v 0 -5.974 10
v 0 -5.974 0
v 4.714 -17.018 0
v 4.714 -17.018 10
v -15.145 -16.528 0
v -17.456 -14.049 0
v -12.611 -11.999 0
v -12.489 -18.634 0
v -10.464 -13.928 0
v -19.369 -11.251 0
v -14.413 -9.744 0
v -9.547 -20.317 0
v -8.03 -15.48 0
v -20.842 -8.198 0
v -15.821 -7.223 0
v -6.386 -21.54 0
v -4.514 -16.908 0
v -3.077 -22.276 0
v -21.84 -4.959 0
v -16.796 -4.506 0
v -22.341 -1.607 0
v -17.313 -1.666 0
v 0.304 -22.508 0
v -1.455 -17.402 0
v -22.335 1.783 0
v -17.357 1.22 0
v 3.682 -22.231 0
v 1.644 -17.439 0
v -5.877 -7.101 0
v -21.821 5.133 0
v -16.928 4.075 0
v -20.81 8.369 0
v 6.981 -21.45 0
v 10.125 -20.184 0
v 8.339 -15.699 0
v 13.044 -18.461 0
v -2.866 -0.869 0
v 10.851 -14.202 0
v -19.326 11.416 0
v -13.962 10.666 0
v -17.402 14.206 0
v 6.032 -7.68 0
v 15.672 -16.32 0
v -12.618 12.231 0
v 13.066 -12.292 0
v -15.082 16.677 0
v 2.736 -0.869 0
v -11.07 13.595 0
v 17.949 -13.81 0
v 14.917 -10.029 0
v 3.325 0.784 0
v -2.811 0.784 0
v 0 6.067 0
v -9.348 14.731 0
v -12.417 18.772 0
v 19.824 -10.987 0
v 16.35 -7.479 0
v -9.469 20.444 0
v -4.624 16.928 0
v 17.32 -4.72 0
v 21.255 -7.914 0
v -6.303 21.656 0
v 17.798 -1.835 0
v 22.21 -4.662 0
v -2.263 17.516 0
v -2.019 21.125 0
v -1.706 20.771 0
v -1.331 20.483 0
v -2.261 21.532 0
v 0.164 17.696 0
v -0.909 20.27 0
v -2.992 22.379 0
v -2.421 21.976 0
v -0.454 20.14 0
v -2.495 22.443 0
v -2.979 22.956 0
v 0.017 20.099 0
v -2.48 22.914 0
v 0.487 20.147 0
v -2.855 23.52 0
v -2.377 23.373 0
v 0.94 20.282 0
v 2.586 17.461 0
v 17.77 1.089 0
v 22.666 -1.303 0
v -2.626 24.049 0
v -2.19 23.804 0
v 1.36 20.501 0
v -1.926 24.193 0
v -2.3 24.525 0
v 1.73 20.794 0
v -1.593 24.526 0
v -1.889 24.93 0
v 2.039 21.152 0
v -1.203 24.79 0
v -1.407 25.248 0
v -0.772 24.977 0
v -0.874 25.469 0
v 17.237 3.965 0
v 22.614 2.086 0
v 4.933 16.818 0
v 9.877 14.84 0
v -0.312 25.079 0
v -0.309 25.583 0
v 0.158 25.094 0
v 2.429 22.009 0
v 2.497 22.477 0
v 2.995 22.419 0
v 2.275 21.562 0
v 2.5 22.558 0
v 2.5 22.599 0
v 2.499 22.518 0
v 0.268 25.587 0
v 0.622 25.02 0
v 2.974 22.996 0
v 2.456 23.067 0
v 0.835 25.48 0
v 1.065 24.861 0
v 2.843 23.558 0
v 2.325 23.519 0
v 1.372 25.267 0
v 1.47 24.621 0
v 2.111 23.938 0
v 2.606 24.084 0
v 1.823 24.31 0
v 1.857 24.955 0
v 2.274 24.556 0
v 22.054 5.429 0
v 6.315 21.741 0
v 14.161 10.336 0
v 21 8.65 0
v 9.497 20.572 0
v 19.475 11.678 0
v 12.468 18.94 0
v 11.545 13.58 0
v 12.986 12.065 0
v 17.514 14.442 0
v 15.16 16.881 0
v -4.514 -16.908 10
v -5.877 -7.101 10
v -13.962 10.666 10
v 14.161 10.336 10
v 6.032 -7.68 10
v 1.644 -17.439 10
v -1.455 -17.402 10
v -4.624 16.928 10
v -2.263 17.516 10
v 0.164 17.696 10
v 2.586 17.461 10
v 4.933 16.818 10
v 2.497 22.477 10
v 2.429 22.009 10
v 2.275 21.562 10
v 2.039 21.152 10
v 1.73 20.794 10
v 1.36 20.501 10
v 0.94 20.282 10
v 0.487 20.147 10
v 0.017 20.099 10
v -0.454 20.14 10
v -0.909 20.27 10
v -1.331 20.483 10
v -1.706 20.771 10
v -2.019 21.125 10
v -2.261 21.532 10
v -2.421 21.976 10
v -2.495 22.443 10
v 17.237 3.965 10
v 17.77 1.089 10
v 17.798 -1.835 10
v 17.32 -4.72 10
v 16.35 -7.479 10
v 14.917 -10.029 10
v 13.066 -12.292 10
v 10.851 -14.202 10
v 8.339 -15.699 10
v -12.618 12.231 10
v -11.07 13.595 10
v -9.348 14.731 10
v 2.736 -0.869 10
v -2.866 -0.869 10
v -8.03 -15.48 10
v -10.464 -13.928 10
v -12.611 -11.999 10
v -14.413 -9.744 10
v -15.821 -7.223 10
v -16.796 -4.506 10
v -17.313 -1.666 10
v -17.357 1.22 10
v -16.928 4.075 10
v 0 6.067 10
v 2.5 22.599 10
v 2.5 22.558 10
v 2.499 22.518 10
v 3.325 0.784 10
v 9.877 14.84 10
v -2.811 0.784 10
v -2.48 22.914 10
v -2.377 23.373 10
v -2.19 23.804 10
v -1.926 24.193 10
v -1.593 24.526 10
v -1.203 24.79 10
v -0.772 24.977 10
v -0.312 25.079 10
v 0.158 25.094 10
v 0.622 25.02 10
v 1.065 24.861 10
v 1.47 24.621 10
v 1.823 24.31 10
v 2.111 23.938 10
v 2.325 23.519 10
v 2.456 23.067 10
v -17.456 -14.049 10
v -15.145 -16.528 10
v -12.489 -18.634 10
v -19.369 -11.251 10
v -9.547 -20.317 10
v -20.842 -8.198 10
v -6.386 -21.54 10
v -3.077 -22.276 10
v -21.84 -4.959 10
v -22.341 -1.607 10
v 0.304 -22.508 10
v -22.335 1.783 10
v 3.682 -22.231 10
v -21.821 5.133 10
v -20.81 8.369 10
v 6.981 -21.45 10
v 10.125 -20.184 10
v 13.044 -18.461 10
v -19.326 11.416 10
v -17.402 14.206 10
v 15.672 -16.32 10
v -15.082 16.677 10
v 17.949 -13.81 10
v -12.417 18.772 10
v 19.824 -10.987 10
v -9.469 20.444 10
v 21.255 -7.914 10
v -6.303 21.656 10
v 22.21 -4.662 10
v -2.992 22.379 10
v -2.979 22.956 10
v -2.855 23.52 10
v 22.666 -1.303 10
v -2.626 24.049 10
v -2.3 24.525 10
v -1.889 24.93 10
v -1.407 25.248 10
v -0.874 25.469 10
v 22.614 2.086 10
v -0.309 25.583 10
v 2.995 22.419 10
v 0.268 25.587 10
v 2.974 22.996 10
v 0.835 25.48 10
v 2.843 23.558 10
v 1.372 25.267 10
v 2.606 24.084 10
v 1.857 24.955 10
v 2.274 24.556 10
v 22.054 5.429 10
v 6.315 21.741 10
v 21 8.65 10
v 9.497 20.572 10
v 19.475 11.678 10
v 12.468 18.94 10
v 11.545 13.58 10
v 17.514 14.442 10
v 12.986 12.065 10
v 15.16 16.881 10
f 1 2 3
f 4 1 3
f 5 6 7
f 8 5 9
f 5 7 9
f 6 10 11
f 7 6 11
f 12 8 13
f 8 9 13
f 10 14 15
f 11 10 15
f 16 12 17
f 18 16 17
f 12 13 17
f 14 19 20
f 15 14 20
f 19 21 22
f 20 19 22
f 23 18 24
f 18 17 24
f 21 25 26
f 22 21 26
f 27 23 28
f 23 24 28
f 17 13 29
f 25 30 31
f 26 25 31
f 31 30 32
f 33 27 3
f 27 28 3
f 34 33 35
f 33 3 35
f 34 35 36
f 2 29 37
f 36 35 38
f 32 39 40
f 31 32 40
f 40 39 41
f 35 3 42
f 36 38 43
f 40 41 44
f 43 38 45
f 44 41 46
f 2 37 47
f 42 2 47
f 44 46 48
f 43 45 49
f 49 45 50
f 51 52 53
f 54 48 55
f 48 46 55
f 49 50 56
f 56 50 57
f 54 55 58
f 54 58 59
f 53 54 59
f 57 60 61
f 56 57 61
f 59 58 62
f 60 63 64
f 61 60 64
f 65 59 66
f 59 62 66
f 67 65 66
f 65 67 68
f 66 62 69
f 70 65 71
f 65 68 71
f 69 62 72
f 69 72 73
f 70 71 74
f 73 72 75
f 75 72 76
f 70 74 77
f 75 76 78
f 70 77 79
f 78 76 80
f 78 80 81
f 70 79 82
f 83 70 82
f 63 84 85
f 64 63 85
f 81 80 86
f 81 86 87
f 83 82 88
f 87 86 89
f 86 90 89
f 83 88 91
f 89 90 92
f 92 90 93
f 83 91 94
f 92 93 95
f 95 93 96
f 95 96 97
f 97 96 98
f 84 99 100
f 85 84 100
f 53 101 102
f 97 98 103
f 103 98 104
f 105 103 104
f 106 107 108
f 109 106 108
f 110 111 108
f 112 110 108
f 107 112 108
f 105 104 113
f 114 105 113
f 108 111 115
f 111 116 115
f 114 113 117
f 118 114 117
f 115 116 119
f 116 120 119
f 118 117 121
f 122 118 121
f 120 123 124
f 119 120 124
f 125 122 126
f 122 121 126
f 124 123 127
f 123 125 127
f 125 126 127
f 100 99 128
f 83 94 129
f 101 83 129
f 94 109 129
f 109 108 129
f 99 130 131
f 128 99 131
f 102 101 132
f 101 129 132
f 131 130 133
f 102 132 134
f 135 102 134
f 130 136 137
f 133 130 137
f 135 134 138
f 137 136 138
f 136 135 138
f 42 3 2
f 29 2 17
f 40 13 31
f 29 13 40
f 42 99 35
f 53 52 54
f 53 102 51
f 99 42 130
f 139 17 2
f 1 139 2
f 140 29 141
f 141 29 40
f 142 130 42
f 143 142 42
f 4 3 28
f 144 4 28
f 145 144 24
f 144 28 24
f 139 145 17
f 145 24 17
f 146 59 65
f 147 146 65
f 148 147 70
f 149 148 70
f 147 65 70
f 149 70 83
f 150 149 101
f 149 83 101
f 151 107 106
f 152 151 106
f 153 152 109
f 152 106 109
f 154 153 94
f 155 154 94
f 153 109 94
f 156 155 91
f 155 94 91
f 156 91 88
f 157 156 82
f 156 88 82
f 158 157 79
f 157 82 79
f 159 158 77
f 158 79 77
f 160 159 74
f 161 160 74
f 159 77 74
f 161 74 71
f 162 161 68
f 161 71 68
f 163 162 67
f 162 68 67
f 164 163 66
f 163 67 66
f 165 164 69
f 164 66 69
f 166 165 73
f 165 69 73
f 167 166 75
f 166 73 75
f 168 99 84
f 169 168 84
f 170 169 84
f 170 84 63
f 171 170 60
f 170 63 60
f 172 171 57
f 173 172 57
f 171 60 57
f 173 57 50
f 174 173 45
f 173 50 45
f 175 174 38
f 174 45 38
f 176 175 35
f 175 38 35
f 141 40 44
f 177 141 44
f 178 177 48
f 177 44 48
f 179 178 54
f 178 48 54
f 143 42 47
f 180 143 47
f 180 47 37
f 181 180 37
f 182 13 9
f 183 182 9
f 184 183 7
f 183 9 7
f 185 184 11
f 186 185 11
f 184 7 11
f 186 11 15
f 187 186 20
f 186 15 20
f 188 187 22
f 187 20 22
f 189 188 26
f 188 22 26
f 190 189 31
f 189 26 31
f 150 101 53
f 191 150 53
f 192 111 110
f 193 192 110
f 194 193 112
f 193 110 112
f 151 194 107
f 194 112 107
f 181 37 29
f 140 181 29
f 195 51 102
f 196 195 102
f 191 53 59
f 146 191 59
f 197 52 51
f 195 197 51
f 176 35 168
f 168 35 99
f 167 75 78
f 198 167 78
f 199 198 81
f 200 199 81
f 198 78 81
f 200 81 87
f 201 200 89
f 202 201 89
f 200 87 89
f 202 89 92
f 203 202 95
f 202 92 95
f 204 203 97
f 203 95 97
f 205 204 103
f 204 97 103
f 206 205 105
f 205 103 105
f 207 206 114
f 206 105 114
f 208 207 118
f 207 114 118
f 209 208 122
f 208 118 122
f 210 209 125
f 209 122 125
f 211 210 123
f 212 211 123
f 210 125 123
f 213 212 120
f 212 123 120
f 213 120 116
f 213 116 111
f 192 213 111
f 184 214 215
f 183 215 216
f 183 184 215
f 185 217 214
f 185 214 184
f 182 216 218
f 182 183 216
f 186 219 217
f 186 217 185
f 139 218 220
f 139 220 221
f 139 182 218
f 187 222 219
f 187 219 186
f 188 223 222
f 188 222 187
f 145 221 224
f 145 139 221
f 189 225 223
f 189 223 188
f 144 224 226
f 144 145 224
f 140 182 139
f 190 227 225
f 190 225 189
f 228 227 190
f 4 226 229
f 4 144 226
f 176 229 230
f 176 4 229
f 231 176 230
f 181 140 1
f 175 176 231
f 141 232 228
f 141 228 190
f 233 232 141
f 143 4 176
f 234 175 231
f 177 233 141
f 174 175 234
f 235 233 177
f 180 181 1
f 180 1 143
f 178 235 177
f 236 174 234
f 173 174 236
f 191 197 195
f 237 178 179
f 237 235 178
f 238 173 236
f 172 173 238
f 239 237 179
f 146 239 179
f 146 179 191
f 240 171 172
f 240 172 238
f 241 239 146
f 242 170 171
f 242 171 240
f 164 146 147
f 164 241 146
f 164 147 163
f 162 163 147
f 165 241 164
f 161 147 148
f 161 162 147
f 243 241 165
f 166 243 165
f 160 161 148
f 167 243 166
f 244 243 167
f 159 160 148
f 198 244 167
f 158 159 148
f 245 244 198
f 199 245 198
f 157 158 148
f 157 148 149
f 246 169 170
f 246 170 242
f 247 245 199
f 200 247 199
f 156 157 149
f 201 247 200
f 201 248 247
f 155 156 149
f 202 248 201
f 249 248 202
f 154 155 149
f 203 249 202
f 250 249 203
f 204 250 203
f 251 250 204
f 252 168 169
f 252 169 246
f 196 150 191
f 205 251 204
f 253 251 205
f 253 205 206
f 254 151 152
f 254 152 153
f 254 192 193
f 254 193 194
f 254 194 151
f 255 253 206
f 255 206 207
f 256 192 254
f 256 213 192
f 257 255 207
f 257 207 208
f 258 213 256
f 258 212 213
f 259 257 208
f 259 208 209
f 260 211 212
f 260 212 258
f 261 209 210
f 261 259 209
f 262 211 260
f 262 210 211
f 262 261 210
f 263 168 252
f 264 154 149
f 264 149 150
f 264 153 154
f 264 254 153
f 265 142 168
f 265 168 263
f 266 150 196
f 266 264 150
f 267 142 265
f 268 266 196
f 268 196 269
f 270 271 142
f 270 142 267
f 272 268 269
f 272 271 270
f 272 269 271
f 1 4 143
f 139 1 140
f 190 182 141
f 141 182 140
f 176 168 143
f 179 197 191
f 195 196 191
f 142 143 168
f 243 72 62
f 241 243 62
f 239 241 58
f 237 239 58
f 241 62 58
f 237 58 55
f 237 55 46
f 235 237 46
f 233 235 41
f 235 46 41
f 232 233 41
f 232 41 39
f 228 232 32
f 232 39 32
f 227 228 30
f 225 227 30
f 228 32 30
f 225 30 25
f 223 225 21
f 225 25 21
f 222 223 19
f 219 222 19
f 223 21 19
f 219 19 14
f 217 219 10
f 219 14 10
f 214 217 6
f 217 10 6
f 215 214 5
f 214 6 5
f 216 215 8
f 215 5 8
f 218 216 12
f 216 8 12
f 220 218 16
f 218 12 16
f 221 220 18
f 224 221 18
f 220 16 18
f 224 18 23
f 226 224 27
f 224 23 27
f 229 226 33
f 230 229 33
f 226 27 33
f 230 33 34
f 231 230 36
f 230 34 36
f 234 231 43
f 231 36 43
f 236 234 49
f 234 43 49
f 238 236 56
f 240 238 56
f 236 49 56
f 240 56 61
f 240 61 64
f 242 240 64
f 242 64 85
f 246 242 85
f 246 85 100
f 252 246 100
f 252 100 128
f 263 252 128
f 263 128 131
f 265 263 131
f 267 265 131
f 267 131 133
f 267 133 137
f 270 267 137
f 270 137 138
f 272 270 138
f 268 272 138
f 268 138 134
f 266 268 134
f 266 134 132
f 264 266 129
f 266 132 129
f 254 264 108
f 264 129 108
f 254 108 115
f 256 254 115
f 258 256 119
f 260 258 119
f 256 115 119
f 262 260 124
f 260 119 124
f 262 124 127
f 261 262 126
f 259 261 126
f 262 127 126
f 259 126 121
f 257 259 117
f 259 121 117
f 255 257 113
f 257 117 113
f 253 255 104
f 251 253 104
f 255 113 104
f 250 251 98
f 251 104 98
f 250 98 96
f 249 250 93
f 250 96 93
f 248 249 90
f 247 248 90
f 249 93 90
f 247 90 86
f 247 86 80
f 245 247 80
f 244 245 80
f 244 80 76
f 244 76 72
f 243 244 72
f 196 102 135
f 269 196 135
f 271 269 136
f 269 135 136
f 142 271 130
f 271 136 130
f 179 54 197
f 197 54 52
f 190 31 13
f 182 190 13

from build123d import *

# Parameters (mm, degrees)
F1_DEPTH = 10


with BuildPart() as f1:
    # F0 (on Top) → F1 (new body)
    with BuildSketch(Plane.XY):
        with BuildLine():
            ThreePointArc((2.497035, 22.477096), (0.016859, 20.098873), (-2.495166, 22.44343))
            ThreePointArc((-2.495166, 22.44343), (-2.743734, 22.412651), (-2.991944, 22.379114))
            ThreePointArc((-2.991944, 22.379114), (0.304191, -22.508373), (2.994635, 22.419486))
            ThreePointArc((2.994635, 22.419486), (2.745995, 22.449673), (2.497035, 22.477096))
        make_face()
        with BuildLine():
            ThreePointArc((4.713637, -17.017649), (0.09357, -17.47788), (-4.514231, -16.907794))
            Line((-4.514231, -16.907794), (0, -5.973655))
            Line((0, -5.973655), (4.713637, -17.017649))
        make_face(mode=Mode.SUBTRACT)
        with BuildLine():
            ThreePointArc((-8.029609, -15.479672), (-15.820727, -7.22331), (-16.927909, 4.074618))
            Line((-16.927909, 4.074618), (-8.029609, -15.479672))
        make_face(mode=Mode.SUBTRACT)
        with BuildLine():
            ThreePointArc((17.23717, 3.964762), (16.349809, -7.479071), (8.33887, -15.699385))
            Line((8.33887, -15.699385), (17.23717, 3.964762))
        make_face(mode=Mode.SUBTRACT)
        with BuildLine():
            ThreePointArc((-13.96181, 10.665952), (-11.867447, 12.939615), (-9.347876, 14.730607))
            Line((-9.347876, 14.730607), (-2.811192, 0.784471))
            Line((-2.811192, 0.784471), (3.325497, 0.784471))
            Line((3.325497, 0.784471), (9.876846, 14.840462))
            ThreePointArc((9.876846, 14.840462), (12.296267, 12.852136), (14.161215, 10.336385))
            Line((14.161215, 10.336385), (6.031903, -7.679928))
            Line((6.031903, -7.679928), (2.736236, -0.868883))
            Line((2.736236, -0.868883), (-2.866398, -0.868883))
            Line((-2.866398, -0.868883), (-5.876908, -7.100868))
            Line((-5.876908, -7.100868), (-13.96181, 10.665952))
        make_face(mode=Mode.SUBTRACT)
        with BuildLine():
            ThreePointArc((-4.624086, 16.927719), (0.16409, 17.695766), (4.933347, 16.817864))
            Line((4.933347, 16.817864), (0, 6.066685))
            Line((0, 6.066685), (-4.624086, 16.927719))
        make_face(mode=Mode.SUBTRACT)
        with BuildLine():
            ThreePointArc((-2.991944, 22.379114), (-2.743734, 22.412651), (-2.495166, 22.44343))
            ThreePointArc((-2.495166, 22.44343), (-0.07773, 25.097607), (2.5, 22.598816))
            ThreePointArc((2.5, 22.598816), (2.499259, 22.537938), (2.497035, 22.477096))
            ThreePointArc((2.497035, 22.477096), (2.745995, 22.449673), (2.994635, 22.419486))
            ThreePointArc((2.994635, 22.419486), (-0.020231, 25.598748), (-2.991944, 22.379114))
        make_face()
    extrude(amount=F1_DEPTH)


solid = f1.part
